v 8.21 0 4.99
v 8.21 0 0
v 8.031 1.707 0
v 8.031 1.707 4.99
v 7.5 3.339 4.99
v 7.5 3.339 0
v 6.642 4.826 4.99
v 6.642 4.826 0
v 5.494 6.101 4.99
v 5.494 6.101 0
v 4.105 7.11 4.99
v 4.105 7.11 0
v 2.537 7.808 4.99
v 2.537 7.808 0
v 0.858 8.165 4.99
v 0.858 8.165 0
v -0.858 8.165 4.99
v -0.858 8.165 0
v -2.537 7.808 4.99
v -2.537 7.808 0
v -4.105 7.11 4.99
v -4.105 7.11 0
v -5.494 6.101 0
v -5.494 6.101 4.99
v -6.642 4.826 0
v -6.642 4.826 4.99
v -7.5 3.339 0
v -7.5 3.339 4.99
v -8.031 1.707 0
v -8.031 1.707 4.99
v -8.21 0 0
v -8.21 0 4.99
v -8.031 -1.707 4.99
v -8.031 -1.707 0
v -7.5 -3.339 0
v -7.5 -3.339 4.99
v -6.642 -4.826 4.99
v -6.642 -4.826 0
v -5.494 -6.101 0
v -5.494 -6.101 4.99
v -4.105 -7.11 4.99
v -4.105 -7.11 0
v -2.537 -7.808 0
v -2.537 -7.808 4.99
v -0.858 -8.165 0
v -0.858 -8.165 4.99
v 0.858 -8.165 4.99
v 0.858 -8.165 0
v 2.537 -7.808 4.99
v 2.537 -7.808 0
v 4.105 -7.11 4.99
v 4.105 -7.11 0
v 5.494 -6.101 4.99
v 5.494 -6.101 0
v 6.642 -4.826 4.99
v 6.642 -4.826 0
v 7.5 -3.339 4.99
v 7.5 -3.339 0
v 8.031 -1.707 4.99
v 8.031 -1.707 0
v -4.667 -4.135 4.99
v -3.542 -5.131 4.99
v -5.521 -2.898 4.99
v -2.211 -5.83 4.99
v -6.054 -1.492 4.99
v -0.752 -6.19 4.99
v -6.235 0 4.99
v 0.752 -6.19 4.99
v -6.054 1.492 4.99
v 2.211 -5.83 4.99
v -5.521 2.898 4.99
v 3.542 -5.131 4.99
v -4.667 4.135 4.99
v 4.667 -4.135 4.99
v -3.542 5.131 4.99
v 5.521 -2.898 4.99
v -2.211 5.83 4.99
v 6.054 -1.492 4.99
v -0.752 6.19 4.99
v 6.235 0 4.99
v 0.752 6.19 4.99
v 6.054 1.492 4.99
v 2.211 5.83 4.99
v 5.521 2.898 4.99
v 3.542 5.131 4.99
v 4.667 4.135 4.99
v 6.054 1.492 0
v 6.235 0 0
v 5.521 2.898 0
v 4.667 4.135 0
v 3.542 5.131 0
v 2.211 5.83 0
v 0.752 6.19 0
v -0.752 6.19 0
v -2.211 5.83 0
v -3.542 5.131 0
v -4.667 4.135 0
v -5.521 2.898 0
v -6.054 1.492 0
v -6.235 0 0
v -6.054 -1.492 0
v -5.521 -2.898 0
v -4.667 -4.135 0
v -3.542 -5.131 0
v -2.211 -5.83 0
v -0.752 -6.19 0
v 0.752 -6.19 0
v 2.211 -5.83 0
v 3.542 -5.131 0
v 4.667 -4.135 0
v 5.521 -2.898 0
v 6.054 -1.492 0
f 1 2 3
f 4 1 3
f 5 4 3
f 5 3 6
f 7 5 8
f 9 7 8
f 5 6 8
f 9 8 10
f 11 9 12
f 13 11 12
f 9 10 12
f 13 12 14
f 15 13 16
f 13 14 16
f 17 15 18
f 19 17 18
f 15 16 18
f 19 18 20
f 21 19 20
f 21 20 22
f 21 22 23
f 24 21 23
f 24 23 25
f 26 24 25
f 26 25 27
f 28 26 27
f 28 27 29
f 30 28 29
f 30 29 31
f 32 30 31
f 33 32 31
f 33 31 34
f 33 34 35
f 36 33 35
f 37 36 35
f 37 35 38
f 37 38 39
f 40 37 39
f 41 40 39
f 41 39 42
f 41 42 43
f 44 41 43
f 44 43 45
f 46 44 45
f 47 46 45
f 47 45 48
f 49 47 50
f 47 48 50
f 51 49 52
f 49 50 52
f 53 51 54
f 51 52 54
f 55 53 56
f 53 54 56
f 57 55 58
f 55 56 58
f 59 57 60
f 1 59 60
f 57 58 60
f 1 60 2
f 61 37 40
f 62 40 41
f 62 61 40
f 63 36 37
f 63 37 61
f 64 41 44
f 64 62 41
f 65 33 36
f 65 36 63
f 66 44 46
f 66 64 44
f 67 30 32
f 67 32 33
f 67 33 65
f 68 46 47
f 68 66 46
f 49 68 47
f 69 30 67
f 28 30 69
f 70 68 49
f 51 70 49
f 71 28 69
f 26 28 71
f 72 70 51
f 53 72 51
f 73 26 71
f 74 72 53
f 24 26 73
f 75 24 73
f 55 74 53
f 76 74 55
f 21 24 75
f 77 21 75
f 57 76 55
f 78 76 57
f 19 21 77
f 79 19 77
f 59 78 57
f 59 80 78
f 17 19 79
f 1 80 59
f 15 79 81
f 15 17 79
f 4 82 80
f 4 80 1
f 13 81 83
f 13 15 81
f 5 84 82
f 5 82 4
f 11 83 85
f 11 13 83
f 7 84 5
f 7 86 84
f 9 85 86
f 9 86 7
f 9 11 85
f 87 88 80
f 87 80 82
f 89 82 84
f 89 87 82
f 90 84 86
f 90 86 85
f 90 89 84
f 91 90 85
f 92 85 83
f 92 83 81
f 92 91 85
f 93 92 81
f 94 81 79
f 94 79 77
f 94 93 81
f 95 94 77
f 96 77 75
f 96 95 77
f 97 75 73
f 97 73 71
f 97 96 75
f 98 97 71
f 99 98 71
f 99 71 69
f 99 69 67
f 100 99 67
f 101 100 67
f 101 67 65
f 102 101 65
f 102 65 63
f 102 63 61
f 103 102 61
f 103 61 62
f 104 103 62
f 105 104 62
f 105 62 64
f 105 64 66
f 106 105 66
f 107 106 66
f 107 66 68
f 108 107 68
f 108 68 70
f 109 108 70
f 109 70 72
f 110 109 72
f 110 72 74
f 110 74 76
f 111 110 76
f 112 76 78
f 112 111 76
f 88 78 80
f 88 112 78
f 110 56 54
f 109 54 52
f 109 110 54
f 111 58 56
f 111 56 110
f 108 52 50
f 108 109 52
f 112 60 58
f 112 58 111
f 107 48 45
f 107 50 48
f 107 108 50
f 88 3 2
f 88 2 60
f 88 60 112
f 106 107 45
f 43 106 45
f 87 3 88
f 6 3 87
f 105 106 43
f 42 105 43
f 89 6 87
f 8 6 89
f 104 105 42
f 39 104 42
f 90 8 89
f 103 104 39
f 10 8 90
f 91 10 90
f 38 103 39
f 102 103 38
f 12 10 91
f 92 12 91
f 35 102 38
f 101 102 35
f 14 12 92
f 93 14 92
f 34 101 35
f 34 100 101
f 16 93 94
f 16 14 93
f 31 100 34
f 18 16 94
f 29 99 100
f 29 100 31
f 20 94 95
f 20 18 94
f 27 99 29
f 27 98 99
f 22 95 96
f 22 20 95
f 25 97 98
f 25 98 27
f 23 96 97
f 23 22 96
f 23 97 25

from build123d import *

# Parameters (mm, degrees)
SKETCH2_R           = 8.21
SKETCH2_R_2         = 6.235
BOSS_EXTRUDE1_DEPTH = 6.99
CUT_EXTRUDE3_START  = -2
SKETCH3_R           = 8.21
SKETCH3_R_2         = 6.235
CUT_EXTRUDE3_DEPTH  = 2
BOSS_EXTRUDE2_START = 2
SKETCH4_R           = 8.21
SKETCH4_R_2         = 6.235
BOSS_EXTRUDE2_DEPTH = 2
SKETCH7_R           = 8.21
SKETCH7_R_2         = 6.235
CUT_EXTRUDE4_DEPTH  = 2


with BuildPart() as part:
    # Sketch2 → Boss-Extrude1 (new body)
    with BuildSketch(Plane.XY):
        Circle(SKETCH2_R)
        Circle(SKETCH2_R_2, mode=Mode.SUBTRACT)
    extrude(amount=BOSS_EXTRUDE1_DEPTH)

    # Sketch3 → Cut-Extrude3 (cut)
    with BuildSketch(Plane.XY.offset(6.99).offset(CUT_EXTRUDE3_START)):
        Circle(SKETCH3_R)
        Circle(SKETCH3_R_2, mode=Mode.SUBTRACT)
    extrude(amount=CUT_EXTRUDE3_DEPTH, mode=Mode.SUBTRACT)

    # Sketch4 → Boss-Extrude2 (add)
    with BuildSketch(Plane(origin=(0, 0, 0), x_dir=(-1, 0, 0), z_dir=(0, 0, -1)).offset(BOSS_EXTRUDE2_START)):
        Circle(SKETCH4_R)
        Circle(SKETCH4_R_2, mode=Mode.SUBTRACT)
    extrude(amount=-BOSS_EXTRUDE2_DEPTH)

    # Sketch7 → Cut-Extrude4 (cut)
    with BuildSketch(Plane(origin=(0, 0, -2), x_dir=(-1, 0, 0), z_dir=(0, 0, -1))):
        Circle(SKETCH7_R)
        Circle(SKETCH7_R_2, mode=Mode.SUBTRACT)
    extrude(amount=-CUT_EXTRUDE4_DEPTH, mode=Mode.SUBTRACT)


solid = part.part
